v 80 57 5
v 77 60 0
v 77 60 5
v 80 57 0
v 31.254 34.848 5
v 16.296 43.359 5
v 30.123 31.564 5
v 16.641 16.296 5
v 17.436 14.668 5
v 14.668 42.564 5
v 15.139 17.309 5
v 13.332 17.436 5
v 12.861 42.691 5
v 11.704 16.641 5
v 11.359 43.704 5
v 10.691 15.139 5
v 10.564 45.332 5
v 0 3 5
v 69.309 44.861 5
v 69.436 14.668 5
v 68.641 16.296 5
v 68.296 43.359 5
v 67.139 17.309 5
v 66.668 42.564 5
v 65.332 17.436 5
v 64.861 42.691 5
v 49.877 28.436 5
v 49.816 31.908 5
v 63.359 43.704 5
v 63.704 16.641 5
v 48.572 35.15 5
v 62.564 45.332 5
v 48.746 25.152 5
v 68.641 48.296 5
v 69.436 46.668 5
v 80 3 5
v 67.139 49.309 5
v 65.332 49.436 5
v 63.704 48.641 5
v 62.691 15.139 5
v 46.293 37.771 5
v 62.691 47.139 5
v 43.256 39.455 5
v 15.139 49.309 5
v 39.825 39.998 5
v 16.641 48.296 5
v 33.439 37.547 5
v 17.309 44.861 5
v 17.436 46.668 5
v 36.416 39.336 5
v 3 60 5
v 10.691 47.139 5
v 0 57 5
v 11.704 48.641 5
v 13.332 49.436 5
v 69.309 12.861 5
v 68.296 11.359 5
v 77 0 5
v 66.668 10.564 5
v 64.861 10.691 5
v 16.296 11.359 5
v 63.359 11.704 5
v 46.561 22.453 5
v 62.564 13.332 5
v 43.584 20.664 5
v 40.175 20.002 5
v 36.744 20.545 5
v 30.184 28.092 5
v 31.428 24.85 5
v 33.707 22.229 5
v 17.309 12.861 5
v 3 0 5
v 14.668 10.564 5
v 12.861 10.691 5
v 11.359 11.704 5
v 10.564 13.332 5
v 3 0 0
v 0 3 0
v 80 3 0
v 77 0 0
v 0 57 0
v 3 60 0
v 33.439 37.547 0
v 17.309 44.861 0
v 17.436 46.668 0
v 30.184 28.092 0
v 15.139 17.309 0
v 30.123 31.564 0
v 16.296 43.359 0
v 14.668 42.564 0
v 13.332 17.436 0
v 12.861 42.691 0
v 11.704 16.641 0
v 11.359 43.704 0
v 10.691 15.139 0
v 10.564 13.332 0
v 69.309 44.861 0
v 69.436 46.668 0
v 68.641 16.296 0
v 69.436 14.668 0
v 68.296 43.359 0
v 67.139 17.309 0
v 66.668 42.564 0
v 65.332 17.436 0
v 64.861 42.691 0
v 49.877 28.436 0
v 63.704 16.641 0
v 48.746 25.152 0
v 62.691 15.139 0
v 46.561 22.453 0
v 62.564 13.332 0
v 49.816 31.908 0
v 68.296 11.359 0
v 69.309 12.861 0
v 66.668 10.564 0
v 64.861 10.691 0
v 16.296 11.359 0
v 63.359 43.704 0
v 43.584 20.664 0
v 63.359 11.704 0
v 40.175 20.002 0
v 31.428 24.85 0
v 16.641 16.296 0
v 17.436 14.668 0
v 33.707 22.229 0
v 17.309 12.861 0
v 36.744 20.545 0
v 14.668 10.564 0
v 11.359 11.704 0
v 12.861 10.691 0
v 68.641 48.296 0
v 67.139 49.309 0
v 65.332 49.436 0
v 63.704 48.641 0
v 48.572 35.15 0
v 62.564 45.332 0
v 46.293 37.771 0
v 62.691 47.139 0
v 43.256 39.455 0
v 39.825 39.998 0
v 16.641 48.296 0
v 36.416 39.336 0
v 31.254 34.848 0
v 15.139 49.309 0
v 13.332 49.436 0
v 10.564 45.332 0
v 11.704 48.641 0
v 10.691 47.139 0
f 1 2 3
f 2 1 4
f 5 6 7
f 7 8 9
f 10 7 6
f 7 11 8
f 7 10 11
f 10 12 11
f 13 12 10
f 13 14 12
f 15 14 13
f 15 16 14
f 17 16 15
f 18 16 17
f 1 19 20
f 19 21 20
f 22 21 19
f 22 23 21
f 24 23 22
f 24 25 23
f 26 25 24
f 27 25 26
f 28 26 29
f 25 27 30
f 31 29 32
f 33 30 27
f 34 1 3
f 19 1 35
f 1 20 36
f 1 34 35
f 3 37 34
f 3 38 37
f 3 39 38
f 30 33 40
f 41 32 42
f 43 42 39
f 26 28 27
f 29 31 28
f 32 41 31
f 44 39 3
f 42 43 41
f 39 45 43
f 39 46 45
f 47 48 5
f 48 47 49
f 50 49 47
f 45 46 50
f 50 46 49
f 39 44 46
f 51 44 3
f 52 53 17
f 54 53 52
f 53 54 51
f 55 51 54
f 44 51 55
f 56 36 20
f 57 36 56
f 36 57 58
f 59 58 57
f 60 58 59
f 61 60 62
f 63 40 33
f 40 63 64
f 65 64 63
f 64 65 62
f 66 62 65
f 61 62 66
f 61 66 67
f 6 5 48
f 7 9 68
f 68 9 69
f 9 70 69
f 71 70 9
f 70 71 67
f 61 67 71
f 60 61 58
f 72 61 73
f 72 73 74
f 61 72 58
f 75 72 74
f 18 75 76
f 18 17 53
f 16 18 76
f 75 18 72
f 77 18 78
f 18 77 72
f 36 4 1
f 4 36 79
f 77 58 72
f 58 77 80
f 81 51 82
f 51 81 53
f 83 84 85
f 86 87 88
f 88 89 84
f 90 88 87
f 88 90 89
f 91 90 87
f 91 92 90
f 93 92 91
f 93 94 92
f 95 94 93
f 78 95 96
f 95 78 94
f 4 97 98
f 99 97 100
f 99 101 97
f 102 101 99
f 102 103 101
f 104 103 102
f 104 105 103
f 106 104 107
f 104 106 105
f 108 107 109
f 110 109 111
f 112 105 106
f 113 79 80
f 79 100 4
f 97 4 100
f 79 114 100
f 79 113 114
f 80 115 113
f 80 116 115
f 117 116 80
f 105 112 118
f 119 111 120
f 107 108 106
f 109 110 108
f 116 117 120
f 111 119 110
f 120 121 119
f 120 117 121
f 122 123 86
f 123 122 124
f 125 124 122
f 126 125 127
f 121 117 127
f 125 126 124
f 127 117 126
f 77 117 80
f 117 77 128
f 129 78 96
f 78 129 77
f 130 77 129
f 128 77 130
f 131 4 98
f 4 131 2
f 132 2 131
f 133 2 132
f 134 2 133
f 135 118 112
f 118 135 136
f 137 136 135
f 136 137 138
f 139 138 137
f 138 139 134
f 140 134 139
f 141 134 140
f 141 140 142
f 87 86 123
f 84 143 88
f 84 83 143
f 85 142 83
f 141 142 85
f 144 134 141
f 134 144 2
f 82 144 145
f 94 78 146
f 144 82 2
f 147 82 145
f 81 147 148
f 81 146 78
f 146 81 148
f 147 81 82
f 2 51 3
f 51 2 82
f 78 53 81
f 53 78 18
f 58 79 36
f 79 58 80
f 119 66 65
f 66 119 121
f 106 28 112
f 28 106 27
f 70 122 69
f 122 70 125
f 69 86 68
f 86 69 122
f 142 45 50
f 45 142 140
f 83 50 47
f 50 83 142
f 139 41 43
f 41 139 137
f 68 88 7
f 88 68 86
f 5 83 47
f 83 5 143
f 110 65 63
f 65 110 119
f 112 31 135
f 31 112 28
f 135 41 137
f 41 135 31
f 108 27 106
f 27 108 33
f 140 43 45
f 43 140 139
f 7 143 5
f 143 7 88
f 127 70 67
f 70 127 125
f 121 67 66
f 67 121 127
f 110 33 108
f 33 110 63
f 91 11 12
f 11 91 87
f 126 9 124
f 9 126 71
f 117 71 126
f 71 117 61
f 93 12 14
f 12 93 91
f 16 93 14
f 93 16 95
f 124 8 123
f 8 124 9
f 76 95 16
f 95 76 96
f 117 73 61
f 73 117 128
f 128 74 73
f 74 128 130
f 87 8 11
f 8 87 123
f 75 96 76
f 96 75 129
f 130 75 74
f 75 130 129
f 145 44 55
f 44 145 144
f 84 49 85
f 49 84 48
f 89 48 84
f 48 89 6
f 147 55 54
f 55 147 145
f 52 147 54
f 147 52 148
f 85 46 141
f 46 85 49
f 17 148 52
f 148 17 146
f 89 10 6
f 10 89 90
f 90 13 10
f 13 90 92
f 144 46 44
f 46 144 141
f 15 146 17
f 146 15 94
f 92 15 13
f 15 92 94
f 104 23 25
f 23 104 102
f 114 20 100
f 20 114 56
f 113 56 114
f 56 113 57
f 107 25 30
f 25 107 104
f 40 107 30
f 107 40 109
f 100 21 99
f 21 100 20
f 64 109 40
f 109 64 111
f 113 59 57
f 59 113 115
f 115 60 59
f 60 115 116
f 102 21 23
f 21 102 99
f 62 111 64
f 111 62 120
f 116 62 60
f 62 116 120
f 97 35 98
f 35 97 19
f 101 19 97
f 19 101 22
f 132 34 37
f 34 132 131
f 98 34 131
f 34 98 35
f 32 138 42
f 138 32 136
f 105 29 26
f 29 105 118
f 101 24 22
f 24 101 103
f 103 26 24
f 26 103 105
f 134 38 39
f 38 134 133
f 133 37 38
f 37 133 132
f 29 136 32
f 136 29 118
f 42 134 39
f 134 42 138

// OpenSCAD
$fn = 32;

// ----------------------------------------------------------------------
// Spacer plate: rect 80 x 60
// ----------------------------------------------------------------------

// --- parameters (mm) ---
bore_r = 10;              // centre bore radius
bolt_r = 3.5;             // bolt hole radius
plate_t = 5;              // plate thickness, Z (extrusion height)
plate_l = 80;             // plate length, X
plate_w = 60;             // plate width, Y
inset = 14;               // corner hole inset

profile = [[3, 0], [77, 0], [80, 3], [80, 57], [77, 60], [3, 60], [0, 57], [0, 3]];  // primary outline, 8 points, counter clockwise
void_1 = [[49.816, 31.908], [48.572, 35.15], [46.293, 37.771], [43.256, 39.455], [39.825, 39.998], [36.416, 39.336], [33.439, 37.547], [31.254, 34.848], [30.123, 31.564], [30.184, 28.092], [31.428, 24.85], [33.707, 22.229], [36.744, 20.545], [40.175, 20.002], [43.584, 20.664], [46.561, 22.453], [48.746, 25.152], [49.877, 28.436]];  // centre bore, 18 points
void_2 = [[17.436, 14.668], [16.641, 16.296], [15.139, 17.309], [13.332, 17.436], [11.704, 16.641], [10.691, 15.139], [10.564, 13.332], [11.359, 11.704], [12.861, 10.691], [14.668, 10.564], [16.296, 11.359], [17.309, 12.861]];  // corner hole, 12 points
void_3 = [[17.436, 46.668], [16.641, 48.296], [15.139, 49.309], [13.332, 49.436], [11.704, 48.641], [10.691, 47.139], [10.564, 45.332], [11.359, 43.704], [12.861, 42.691], [14.668, 42.564], [16.296, 43.359], [17.309, 44.861]];  // corner hole, 12 points
void_4 = [[69.436, 14.668], [68.641, 16.296], [67.139, 17.309], [65.332, 17.436], [63.704, 16.641], [62.691, 15.139], [62.564, 13.332], [63.359, 11.704], [64.861, 10.691], [66.668, 10.564], [68.296, 11.359], [69.309, 12.861]];  // corner hole, 12 points
void_5 = [[69.436, 46.668], [68.641, 48.296], [67.139, 49.309], [65.332, 49.436], [63.704, 48.641], [62.691, 47.139], [62.564, 45.332], [63.359, 43.704], [64.861, 42.691], [66.668, 42.564], [68.296, 43.359], [69.309, 44.861]];  // corner hole, 12 points

// --- the one profile operation ---
difference() {
  linear_extrude(height = plate_t) polygon(points = profile);
  translate([0, 0, -1])
    linear_extrude(height = plate_t + 2) polygon(points = void_1);
  translate([0, 0, -1])
    linear_extrude(height = plate_t + 2) polygon(points = void_2);
  translate([0, 0, -1])
    linear_extrude(height = plate_t + 2) polygon(points = void_3);
  translate([0, 0, -1])
    linear_extrude(height = plate_t + 2) polygon(points = void_4);
  translate([0, 0, -1])
    linear_extrude(height = plate_t + 2) polygon(points = void_5);
}
